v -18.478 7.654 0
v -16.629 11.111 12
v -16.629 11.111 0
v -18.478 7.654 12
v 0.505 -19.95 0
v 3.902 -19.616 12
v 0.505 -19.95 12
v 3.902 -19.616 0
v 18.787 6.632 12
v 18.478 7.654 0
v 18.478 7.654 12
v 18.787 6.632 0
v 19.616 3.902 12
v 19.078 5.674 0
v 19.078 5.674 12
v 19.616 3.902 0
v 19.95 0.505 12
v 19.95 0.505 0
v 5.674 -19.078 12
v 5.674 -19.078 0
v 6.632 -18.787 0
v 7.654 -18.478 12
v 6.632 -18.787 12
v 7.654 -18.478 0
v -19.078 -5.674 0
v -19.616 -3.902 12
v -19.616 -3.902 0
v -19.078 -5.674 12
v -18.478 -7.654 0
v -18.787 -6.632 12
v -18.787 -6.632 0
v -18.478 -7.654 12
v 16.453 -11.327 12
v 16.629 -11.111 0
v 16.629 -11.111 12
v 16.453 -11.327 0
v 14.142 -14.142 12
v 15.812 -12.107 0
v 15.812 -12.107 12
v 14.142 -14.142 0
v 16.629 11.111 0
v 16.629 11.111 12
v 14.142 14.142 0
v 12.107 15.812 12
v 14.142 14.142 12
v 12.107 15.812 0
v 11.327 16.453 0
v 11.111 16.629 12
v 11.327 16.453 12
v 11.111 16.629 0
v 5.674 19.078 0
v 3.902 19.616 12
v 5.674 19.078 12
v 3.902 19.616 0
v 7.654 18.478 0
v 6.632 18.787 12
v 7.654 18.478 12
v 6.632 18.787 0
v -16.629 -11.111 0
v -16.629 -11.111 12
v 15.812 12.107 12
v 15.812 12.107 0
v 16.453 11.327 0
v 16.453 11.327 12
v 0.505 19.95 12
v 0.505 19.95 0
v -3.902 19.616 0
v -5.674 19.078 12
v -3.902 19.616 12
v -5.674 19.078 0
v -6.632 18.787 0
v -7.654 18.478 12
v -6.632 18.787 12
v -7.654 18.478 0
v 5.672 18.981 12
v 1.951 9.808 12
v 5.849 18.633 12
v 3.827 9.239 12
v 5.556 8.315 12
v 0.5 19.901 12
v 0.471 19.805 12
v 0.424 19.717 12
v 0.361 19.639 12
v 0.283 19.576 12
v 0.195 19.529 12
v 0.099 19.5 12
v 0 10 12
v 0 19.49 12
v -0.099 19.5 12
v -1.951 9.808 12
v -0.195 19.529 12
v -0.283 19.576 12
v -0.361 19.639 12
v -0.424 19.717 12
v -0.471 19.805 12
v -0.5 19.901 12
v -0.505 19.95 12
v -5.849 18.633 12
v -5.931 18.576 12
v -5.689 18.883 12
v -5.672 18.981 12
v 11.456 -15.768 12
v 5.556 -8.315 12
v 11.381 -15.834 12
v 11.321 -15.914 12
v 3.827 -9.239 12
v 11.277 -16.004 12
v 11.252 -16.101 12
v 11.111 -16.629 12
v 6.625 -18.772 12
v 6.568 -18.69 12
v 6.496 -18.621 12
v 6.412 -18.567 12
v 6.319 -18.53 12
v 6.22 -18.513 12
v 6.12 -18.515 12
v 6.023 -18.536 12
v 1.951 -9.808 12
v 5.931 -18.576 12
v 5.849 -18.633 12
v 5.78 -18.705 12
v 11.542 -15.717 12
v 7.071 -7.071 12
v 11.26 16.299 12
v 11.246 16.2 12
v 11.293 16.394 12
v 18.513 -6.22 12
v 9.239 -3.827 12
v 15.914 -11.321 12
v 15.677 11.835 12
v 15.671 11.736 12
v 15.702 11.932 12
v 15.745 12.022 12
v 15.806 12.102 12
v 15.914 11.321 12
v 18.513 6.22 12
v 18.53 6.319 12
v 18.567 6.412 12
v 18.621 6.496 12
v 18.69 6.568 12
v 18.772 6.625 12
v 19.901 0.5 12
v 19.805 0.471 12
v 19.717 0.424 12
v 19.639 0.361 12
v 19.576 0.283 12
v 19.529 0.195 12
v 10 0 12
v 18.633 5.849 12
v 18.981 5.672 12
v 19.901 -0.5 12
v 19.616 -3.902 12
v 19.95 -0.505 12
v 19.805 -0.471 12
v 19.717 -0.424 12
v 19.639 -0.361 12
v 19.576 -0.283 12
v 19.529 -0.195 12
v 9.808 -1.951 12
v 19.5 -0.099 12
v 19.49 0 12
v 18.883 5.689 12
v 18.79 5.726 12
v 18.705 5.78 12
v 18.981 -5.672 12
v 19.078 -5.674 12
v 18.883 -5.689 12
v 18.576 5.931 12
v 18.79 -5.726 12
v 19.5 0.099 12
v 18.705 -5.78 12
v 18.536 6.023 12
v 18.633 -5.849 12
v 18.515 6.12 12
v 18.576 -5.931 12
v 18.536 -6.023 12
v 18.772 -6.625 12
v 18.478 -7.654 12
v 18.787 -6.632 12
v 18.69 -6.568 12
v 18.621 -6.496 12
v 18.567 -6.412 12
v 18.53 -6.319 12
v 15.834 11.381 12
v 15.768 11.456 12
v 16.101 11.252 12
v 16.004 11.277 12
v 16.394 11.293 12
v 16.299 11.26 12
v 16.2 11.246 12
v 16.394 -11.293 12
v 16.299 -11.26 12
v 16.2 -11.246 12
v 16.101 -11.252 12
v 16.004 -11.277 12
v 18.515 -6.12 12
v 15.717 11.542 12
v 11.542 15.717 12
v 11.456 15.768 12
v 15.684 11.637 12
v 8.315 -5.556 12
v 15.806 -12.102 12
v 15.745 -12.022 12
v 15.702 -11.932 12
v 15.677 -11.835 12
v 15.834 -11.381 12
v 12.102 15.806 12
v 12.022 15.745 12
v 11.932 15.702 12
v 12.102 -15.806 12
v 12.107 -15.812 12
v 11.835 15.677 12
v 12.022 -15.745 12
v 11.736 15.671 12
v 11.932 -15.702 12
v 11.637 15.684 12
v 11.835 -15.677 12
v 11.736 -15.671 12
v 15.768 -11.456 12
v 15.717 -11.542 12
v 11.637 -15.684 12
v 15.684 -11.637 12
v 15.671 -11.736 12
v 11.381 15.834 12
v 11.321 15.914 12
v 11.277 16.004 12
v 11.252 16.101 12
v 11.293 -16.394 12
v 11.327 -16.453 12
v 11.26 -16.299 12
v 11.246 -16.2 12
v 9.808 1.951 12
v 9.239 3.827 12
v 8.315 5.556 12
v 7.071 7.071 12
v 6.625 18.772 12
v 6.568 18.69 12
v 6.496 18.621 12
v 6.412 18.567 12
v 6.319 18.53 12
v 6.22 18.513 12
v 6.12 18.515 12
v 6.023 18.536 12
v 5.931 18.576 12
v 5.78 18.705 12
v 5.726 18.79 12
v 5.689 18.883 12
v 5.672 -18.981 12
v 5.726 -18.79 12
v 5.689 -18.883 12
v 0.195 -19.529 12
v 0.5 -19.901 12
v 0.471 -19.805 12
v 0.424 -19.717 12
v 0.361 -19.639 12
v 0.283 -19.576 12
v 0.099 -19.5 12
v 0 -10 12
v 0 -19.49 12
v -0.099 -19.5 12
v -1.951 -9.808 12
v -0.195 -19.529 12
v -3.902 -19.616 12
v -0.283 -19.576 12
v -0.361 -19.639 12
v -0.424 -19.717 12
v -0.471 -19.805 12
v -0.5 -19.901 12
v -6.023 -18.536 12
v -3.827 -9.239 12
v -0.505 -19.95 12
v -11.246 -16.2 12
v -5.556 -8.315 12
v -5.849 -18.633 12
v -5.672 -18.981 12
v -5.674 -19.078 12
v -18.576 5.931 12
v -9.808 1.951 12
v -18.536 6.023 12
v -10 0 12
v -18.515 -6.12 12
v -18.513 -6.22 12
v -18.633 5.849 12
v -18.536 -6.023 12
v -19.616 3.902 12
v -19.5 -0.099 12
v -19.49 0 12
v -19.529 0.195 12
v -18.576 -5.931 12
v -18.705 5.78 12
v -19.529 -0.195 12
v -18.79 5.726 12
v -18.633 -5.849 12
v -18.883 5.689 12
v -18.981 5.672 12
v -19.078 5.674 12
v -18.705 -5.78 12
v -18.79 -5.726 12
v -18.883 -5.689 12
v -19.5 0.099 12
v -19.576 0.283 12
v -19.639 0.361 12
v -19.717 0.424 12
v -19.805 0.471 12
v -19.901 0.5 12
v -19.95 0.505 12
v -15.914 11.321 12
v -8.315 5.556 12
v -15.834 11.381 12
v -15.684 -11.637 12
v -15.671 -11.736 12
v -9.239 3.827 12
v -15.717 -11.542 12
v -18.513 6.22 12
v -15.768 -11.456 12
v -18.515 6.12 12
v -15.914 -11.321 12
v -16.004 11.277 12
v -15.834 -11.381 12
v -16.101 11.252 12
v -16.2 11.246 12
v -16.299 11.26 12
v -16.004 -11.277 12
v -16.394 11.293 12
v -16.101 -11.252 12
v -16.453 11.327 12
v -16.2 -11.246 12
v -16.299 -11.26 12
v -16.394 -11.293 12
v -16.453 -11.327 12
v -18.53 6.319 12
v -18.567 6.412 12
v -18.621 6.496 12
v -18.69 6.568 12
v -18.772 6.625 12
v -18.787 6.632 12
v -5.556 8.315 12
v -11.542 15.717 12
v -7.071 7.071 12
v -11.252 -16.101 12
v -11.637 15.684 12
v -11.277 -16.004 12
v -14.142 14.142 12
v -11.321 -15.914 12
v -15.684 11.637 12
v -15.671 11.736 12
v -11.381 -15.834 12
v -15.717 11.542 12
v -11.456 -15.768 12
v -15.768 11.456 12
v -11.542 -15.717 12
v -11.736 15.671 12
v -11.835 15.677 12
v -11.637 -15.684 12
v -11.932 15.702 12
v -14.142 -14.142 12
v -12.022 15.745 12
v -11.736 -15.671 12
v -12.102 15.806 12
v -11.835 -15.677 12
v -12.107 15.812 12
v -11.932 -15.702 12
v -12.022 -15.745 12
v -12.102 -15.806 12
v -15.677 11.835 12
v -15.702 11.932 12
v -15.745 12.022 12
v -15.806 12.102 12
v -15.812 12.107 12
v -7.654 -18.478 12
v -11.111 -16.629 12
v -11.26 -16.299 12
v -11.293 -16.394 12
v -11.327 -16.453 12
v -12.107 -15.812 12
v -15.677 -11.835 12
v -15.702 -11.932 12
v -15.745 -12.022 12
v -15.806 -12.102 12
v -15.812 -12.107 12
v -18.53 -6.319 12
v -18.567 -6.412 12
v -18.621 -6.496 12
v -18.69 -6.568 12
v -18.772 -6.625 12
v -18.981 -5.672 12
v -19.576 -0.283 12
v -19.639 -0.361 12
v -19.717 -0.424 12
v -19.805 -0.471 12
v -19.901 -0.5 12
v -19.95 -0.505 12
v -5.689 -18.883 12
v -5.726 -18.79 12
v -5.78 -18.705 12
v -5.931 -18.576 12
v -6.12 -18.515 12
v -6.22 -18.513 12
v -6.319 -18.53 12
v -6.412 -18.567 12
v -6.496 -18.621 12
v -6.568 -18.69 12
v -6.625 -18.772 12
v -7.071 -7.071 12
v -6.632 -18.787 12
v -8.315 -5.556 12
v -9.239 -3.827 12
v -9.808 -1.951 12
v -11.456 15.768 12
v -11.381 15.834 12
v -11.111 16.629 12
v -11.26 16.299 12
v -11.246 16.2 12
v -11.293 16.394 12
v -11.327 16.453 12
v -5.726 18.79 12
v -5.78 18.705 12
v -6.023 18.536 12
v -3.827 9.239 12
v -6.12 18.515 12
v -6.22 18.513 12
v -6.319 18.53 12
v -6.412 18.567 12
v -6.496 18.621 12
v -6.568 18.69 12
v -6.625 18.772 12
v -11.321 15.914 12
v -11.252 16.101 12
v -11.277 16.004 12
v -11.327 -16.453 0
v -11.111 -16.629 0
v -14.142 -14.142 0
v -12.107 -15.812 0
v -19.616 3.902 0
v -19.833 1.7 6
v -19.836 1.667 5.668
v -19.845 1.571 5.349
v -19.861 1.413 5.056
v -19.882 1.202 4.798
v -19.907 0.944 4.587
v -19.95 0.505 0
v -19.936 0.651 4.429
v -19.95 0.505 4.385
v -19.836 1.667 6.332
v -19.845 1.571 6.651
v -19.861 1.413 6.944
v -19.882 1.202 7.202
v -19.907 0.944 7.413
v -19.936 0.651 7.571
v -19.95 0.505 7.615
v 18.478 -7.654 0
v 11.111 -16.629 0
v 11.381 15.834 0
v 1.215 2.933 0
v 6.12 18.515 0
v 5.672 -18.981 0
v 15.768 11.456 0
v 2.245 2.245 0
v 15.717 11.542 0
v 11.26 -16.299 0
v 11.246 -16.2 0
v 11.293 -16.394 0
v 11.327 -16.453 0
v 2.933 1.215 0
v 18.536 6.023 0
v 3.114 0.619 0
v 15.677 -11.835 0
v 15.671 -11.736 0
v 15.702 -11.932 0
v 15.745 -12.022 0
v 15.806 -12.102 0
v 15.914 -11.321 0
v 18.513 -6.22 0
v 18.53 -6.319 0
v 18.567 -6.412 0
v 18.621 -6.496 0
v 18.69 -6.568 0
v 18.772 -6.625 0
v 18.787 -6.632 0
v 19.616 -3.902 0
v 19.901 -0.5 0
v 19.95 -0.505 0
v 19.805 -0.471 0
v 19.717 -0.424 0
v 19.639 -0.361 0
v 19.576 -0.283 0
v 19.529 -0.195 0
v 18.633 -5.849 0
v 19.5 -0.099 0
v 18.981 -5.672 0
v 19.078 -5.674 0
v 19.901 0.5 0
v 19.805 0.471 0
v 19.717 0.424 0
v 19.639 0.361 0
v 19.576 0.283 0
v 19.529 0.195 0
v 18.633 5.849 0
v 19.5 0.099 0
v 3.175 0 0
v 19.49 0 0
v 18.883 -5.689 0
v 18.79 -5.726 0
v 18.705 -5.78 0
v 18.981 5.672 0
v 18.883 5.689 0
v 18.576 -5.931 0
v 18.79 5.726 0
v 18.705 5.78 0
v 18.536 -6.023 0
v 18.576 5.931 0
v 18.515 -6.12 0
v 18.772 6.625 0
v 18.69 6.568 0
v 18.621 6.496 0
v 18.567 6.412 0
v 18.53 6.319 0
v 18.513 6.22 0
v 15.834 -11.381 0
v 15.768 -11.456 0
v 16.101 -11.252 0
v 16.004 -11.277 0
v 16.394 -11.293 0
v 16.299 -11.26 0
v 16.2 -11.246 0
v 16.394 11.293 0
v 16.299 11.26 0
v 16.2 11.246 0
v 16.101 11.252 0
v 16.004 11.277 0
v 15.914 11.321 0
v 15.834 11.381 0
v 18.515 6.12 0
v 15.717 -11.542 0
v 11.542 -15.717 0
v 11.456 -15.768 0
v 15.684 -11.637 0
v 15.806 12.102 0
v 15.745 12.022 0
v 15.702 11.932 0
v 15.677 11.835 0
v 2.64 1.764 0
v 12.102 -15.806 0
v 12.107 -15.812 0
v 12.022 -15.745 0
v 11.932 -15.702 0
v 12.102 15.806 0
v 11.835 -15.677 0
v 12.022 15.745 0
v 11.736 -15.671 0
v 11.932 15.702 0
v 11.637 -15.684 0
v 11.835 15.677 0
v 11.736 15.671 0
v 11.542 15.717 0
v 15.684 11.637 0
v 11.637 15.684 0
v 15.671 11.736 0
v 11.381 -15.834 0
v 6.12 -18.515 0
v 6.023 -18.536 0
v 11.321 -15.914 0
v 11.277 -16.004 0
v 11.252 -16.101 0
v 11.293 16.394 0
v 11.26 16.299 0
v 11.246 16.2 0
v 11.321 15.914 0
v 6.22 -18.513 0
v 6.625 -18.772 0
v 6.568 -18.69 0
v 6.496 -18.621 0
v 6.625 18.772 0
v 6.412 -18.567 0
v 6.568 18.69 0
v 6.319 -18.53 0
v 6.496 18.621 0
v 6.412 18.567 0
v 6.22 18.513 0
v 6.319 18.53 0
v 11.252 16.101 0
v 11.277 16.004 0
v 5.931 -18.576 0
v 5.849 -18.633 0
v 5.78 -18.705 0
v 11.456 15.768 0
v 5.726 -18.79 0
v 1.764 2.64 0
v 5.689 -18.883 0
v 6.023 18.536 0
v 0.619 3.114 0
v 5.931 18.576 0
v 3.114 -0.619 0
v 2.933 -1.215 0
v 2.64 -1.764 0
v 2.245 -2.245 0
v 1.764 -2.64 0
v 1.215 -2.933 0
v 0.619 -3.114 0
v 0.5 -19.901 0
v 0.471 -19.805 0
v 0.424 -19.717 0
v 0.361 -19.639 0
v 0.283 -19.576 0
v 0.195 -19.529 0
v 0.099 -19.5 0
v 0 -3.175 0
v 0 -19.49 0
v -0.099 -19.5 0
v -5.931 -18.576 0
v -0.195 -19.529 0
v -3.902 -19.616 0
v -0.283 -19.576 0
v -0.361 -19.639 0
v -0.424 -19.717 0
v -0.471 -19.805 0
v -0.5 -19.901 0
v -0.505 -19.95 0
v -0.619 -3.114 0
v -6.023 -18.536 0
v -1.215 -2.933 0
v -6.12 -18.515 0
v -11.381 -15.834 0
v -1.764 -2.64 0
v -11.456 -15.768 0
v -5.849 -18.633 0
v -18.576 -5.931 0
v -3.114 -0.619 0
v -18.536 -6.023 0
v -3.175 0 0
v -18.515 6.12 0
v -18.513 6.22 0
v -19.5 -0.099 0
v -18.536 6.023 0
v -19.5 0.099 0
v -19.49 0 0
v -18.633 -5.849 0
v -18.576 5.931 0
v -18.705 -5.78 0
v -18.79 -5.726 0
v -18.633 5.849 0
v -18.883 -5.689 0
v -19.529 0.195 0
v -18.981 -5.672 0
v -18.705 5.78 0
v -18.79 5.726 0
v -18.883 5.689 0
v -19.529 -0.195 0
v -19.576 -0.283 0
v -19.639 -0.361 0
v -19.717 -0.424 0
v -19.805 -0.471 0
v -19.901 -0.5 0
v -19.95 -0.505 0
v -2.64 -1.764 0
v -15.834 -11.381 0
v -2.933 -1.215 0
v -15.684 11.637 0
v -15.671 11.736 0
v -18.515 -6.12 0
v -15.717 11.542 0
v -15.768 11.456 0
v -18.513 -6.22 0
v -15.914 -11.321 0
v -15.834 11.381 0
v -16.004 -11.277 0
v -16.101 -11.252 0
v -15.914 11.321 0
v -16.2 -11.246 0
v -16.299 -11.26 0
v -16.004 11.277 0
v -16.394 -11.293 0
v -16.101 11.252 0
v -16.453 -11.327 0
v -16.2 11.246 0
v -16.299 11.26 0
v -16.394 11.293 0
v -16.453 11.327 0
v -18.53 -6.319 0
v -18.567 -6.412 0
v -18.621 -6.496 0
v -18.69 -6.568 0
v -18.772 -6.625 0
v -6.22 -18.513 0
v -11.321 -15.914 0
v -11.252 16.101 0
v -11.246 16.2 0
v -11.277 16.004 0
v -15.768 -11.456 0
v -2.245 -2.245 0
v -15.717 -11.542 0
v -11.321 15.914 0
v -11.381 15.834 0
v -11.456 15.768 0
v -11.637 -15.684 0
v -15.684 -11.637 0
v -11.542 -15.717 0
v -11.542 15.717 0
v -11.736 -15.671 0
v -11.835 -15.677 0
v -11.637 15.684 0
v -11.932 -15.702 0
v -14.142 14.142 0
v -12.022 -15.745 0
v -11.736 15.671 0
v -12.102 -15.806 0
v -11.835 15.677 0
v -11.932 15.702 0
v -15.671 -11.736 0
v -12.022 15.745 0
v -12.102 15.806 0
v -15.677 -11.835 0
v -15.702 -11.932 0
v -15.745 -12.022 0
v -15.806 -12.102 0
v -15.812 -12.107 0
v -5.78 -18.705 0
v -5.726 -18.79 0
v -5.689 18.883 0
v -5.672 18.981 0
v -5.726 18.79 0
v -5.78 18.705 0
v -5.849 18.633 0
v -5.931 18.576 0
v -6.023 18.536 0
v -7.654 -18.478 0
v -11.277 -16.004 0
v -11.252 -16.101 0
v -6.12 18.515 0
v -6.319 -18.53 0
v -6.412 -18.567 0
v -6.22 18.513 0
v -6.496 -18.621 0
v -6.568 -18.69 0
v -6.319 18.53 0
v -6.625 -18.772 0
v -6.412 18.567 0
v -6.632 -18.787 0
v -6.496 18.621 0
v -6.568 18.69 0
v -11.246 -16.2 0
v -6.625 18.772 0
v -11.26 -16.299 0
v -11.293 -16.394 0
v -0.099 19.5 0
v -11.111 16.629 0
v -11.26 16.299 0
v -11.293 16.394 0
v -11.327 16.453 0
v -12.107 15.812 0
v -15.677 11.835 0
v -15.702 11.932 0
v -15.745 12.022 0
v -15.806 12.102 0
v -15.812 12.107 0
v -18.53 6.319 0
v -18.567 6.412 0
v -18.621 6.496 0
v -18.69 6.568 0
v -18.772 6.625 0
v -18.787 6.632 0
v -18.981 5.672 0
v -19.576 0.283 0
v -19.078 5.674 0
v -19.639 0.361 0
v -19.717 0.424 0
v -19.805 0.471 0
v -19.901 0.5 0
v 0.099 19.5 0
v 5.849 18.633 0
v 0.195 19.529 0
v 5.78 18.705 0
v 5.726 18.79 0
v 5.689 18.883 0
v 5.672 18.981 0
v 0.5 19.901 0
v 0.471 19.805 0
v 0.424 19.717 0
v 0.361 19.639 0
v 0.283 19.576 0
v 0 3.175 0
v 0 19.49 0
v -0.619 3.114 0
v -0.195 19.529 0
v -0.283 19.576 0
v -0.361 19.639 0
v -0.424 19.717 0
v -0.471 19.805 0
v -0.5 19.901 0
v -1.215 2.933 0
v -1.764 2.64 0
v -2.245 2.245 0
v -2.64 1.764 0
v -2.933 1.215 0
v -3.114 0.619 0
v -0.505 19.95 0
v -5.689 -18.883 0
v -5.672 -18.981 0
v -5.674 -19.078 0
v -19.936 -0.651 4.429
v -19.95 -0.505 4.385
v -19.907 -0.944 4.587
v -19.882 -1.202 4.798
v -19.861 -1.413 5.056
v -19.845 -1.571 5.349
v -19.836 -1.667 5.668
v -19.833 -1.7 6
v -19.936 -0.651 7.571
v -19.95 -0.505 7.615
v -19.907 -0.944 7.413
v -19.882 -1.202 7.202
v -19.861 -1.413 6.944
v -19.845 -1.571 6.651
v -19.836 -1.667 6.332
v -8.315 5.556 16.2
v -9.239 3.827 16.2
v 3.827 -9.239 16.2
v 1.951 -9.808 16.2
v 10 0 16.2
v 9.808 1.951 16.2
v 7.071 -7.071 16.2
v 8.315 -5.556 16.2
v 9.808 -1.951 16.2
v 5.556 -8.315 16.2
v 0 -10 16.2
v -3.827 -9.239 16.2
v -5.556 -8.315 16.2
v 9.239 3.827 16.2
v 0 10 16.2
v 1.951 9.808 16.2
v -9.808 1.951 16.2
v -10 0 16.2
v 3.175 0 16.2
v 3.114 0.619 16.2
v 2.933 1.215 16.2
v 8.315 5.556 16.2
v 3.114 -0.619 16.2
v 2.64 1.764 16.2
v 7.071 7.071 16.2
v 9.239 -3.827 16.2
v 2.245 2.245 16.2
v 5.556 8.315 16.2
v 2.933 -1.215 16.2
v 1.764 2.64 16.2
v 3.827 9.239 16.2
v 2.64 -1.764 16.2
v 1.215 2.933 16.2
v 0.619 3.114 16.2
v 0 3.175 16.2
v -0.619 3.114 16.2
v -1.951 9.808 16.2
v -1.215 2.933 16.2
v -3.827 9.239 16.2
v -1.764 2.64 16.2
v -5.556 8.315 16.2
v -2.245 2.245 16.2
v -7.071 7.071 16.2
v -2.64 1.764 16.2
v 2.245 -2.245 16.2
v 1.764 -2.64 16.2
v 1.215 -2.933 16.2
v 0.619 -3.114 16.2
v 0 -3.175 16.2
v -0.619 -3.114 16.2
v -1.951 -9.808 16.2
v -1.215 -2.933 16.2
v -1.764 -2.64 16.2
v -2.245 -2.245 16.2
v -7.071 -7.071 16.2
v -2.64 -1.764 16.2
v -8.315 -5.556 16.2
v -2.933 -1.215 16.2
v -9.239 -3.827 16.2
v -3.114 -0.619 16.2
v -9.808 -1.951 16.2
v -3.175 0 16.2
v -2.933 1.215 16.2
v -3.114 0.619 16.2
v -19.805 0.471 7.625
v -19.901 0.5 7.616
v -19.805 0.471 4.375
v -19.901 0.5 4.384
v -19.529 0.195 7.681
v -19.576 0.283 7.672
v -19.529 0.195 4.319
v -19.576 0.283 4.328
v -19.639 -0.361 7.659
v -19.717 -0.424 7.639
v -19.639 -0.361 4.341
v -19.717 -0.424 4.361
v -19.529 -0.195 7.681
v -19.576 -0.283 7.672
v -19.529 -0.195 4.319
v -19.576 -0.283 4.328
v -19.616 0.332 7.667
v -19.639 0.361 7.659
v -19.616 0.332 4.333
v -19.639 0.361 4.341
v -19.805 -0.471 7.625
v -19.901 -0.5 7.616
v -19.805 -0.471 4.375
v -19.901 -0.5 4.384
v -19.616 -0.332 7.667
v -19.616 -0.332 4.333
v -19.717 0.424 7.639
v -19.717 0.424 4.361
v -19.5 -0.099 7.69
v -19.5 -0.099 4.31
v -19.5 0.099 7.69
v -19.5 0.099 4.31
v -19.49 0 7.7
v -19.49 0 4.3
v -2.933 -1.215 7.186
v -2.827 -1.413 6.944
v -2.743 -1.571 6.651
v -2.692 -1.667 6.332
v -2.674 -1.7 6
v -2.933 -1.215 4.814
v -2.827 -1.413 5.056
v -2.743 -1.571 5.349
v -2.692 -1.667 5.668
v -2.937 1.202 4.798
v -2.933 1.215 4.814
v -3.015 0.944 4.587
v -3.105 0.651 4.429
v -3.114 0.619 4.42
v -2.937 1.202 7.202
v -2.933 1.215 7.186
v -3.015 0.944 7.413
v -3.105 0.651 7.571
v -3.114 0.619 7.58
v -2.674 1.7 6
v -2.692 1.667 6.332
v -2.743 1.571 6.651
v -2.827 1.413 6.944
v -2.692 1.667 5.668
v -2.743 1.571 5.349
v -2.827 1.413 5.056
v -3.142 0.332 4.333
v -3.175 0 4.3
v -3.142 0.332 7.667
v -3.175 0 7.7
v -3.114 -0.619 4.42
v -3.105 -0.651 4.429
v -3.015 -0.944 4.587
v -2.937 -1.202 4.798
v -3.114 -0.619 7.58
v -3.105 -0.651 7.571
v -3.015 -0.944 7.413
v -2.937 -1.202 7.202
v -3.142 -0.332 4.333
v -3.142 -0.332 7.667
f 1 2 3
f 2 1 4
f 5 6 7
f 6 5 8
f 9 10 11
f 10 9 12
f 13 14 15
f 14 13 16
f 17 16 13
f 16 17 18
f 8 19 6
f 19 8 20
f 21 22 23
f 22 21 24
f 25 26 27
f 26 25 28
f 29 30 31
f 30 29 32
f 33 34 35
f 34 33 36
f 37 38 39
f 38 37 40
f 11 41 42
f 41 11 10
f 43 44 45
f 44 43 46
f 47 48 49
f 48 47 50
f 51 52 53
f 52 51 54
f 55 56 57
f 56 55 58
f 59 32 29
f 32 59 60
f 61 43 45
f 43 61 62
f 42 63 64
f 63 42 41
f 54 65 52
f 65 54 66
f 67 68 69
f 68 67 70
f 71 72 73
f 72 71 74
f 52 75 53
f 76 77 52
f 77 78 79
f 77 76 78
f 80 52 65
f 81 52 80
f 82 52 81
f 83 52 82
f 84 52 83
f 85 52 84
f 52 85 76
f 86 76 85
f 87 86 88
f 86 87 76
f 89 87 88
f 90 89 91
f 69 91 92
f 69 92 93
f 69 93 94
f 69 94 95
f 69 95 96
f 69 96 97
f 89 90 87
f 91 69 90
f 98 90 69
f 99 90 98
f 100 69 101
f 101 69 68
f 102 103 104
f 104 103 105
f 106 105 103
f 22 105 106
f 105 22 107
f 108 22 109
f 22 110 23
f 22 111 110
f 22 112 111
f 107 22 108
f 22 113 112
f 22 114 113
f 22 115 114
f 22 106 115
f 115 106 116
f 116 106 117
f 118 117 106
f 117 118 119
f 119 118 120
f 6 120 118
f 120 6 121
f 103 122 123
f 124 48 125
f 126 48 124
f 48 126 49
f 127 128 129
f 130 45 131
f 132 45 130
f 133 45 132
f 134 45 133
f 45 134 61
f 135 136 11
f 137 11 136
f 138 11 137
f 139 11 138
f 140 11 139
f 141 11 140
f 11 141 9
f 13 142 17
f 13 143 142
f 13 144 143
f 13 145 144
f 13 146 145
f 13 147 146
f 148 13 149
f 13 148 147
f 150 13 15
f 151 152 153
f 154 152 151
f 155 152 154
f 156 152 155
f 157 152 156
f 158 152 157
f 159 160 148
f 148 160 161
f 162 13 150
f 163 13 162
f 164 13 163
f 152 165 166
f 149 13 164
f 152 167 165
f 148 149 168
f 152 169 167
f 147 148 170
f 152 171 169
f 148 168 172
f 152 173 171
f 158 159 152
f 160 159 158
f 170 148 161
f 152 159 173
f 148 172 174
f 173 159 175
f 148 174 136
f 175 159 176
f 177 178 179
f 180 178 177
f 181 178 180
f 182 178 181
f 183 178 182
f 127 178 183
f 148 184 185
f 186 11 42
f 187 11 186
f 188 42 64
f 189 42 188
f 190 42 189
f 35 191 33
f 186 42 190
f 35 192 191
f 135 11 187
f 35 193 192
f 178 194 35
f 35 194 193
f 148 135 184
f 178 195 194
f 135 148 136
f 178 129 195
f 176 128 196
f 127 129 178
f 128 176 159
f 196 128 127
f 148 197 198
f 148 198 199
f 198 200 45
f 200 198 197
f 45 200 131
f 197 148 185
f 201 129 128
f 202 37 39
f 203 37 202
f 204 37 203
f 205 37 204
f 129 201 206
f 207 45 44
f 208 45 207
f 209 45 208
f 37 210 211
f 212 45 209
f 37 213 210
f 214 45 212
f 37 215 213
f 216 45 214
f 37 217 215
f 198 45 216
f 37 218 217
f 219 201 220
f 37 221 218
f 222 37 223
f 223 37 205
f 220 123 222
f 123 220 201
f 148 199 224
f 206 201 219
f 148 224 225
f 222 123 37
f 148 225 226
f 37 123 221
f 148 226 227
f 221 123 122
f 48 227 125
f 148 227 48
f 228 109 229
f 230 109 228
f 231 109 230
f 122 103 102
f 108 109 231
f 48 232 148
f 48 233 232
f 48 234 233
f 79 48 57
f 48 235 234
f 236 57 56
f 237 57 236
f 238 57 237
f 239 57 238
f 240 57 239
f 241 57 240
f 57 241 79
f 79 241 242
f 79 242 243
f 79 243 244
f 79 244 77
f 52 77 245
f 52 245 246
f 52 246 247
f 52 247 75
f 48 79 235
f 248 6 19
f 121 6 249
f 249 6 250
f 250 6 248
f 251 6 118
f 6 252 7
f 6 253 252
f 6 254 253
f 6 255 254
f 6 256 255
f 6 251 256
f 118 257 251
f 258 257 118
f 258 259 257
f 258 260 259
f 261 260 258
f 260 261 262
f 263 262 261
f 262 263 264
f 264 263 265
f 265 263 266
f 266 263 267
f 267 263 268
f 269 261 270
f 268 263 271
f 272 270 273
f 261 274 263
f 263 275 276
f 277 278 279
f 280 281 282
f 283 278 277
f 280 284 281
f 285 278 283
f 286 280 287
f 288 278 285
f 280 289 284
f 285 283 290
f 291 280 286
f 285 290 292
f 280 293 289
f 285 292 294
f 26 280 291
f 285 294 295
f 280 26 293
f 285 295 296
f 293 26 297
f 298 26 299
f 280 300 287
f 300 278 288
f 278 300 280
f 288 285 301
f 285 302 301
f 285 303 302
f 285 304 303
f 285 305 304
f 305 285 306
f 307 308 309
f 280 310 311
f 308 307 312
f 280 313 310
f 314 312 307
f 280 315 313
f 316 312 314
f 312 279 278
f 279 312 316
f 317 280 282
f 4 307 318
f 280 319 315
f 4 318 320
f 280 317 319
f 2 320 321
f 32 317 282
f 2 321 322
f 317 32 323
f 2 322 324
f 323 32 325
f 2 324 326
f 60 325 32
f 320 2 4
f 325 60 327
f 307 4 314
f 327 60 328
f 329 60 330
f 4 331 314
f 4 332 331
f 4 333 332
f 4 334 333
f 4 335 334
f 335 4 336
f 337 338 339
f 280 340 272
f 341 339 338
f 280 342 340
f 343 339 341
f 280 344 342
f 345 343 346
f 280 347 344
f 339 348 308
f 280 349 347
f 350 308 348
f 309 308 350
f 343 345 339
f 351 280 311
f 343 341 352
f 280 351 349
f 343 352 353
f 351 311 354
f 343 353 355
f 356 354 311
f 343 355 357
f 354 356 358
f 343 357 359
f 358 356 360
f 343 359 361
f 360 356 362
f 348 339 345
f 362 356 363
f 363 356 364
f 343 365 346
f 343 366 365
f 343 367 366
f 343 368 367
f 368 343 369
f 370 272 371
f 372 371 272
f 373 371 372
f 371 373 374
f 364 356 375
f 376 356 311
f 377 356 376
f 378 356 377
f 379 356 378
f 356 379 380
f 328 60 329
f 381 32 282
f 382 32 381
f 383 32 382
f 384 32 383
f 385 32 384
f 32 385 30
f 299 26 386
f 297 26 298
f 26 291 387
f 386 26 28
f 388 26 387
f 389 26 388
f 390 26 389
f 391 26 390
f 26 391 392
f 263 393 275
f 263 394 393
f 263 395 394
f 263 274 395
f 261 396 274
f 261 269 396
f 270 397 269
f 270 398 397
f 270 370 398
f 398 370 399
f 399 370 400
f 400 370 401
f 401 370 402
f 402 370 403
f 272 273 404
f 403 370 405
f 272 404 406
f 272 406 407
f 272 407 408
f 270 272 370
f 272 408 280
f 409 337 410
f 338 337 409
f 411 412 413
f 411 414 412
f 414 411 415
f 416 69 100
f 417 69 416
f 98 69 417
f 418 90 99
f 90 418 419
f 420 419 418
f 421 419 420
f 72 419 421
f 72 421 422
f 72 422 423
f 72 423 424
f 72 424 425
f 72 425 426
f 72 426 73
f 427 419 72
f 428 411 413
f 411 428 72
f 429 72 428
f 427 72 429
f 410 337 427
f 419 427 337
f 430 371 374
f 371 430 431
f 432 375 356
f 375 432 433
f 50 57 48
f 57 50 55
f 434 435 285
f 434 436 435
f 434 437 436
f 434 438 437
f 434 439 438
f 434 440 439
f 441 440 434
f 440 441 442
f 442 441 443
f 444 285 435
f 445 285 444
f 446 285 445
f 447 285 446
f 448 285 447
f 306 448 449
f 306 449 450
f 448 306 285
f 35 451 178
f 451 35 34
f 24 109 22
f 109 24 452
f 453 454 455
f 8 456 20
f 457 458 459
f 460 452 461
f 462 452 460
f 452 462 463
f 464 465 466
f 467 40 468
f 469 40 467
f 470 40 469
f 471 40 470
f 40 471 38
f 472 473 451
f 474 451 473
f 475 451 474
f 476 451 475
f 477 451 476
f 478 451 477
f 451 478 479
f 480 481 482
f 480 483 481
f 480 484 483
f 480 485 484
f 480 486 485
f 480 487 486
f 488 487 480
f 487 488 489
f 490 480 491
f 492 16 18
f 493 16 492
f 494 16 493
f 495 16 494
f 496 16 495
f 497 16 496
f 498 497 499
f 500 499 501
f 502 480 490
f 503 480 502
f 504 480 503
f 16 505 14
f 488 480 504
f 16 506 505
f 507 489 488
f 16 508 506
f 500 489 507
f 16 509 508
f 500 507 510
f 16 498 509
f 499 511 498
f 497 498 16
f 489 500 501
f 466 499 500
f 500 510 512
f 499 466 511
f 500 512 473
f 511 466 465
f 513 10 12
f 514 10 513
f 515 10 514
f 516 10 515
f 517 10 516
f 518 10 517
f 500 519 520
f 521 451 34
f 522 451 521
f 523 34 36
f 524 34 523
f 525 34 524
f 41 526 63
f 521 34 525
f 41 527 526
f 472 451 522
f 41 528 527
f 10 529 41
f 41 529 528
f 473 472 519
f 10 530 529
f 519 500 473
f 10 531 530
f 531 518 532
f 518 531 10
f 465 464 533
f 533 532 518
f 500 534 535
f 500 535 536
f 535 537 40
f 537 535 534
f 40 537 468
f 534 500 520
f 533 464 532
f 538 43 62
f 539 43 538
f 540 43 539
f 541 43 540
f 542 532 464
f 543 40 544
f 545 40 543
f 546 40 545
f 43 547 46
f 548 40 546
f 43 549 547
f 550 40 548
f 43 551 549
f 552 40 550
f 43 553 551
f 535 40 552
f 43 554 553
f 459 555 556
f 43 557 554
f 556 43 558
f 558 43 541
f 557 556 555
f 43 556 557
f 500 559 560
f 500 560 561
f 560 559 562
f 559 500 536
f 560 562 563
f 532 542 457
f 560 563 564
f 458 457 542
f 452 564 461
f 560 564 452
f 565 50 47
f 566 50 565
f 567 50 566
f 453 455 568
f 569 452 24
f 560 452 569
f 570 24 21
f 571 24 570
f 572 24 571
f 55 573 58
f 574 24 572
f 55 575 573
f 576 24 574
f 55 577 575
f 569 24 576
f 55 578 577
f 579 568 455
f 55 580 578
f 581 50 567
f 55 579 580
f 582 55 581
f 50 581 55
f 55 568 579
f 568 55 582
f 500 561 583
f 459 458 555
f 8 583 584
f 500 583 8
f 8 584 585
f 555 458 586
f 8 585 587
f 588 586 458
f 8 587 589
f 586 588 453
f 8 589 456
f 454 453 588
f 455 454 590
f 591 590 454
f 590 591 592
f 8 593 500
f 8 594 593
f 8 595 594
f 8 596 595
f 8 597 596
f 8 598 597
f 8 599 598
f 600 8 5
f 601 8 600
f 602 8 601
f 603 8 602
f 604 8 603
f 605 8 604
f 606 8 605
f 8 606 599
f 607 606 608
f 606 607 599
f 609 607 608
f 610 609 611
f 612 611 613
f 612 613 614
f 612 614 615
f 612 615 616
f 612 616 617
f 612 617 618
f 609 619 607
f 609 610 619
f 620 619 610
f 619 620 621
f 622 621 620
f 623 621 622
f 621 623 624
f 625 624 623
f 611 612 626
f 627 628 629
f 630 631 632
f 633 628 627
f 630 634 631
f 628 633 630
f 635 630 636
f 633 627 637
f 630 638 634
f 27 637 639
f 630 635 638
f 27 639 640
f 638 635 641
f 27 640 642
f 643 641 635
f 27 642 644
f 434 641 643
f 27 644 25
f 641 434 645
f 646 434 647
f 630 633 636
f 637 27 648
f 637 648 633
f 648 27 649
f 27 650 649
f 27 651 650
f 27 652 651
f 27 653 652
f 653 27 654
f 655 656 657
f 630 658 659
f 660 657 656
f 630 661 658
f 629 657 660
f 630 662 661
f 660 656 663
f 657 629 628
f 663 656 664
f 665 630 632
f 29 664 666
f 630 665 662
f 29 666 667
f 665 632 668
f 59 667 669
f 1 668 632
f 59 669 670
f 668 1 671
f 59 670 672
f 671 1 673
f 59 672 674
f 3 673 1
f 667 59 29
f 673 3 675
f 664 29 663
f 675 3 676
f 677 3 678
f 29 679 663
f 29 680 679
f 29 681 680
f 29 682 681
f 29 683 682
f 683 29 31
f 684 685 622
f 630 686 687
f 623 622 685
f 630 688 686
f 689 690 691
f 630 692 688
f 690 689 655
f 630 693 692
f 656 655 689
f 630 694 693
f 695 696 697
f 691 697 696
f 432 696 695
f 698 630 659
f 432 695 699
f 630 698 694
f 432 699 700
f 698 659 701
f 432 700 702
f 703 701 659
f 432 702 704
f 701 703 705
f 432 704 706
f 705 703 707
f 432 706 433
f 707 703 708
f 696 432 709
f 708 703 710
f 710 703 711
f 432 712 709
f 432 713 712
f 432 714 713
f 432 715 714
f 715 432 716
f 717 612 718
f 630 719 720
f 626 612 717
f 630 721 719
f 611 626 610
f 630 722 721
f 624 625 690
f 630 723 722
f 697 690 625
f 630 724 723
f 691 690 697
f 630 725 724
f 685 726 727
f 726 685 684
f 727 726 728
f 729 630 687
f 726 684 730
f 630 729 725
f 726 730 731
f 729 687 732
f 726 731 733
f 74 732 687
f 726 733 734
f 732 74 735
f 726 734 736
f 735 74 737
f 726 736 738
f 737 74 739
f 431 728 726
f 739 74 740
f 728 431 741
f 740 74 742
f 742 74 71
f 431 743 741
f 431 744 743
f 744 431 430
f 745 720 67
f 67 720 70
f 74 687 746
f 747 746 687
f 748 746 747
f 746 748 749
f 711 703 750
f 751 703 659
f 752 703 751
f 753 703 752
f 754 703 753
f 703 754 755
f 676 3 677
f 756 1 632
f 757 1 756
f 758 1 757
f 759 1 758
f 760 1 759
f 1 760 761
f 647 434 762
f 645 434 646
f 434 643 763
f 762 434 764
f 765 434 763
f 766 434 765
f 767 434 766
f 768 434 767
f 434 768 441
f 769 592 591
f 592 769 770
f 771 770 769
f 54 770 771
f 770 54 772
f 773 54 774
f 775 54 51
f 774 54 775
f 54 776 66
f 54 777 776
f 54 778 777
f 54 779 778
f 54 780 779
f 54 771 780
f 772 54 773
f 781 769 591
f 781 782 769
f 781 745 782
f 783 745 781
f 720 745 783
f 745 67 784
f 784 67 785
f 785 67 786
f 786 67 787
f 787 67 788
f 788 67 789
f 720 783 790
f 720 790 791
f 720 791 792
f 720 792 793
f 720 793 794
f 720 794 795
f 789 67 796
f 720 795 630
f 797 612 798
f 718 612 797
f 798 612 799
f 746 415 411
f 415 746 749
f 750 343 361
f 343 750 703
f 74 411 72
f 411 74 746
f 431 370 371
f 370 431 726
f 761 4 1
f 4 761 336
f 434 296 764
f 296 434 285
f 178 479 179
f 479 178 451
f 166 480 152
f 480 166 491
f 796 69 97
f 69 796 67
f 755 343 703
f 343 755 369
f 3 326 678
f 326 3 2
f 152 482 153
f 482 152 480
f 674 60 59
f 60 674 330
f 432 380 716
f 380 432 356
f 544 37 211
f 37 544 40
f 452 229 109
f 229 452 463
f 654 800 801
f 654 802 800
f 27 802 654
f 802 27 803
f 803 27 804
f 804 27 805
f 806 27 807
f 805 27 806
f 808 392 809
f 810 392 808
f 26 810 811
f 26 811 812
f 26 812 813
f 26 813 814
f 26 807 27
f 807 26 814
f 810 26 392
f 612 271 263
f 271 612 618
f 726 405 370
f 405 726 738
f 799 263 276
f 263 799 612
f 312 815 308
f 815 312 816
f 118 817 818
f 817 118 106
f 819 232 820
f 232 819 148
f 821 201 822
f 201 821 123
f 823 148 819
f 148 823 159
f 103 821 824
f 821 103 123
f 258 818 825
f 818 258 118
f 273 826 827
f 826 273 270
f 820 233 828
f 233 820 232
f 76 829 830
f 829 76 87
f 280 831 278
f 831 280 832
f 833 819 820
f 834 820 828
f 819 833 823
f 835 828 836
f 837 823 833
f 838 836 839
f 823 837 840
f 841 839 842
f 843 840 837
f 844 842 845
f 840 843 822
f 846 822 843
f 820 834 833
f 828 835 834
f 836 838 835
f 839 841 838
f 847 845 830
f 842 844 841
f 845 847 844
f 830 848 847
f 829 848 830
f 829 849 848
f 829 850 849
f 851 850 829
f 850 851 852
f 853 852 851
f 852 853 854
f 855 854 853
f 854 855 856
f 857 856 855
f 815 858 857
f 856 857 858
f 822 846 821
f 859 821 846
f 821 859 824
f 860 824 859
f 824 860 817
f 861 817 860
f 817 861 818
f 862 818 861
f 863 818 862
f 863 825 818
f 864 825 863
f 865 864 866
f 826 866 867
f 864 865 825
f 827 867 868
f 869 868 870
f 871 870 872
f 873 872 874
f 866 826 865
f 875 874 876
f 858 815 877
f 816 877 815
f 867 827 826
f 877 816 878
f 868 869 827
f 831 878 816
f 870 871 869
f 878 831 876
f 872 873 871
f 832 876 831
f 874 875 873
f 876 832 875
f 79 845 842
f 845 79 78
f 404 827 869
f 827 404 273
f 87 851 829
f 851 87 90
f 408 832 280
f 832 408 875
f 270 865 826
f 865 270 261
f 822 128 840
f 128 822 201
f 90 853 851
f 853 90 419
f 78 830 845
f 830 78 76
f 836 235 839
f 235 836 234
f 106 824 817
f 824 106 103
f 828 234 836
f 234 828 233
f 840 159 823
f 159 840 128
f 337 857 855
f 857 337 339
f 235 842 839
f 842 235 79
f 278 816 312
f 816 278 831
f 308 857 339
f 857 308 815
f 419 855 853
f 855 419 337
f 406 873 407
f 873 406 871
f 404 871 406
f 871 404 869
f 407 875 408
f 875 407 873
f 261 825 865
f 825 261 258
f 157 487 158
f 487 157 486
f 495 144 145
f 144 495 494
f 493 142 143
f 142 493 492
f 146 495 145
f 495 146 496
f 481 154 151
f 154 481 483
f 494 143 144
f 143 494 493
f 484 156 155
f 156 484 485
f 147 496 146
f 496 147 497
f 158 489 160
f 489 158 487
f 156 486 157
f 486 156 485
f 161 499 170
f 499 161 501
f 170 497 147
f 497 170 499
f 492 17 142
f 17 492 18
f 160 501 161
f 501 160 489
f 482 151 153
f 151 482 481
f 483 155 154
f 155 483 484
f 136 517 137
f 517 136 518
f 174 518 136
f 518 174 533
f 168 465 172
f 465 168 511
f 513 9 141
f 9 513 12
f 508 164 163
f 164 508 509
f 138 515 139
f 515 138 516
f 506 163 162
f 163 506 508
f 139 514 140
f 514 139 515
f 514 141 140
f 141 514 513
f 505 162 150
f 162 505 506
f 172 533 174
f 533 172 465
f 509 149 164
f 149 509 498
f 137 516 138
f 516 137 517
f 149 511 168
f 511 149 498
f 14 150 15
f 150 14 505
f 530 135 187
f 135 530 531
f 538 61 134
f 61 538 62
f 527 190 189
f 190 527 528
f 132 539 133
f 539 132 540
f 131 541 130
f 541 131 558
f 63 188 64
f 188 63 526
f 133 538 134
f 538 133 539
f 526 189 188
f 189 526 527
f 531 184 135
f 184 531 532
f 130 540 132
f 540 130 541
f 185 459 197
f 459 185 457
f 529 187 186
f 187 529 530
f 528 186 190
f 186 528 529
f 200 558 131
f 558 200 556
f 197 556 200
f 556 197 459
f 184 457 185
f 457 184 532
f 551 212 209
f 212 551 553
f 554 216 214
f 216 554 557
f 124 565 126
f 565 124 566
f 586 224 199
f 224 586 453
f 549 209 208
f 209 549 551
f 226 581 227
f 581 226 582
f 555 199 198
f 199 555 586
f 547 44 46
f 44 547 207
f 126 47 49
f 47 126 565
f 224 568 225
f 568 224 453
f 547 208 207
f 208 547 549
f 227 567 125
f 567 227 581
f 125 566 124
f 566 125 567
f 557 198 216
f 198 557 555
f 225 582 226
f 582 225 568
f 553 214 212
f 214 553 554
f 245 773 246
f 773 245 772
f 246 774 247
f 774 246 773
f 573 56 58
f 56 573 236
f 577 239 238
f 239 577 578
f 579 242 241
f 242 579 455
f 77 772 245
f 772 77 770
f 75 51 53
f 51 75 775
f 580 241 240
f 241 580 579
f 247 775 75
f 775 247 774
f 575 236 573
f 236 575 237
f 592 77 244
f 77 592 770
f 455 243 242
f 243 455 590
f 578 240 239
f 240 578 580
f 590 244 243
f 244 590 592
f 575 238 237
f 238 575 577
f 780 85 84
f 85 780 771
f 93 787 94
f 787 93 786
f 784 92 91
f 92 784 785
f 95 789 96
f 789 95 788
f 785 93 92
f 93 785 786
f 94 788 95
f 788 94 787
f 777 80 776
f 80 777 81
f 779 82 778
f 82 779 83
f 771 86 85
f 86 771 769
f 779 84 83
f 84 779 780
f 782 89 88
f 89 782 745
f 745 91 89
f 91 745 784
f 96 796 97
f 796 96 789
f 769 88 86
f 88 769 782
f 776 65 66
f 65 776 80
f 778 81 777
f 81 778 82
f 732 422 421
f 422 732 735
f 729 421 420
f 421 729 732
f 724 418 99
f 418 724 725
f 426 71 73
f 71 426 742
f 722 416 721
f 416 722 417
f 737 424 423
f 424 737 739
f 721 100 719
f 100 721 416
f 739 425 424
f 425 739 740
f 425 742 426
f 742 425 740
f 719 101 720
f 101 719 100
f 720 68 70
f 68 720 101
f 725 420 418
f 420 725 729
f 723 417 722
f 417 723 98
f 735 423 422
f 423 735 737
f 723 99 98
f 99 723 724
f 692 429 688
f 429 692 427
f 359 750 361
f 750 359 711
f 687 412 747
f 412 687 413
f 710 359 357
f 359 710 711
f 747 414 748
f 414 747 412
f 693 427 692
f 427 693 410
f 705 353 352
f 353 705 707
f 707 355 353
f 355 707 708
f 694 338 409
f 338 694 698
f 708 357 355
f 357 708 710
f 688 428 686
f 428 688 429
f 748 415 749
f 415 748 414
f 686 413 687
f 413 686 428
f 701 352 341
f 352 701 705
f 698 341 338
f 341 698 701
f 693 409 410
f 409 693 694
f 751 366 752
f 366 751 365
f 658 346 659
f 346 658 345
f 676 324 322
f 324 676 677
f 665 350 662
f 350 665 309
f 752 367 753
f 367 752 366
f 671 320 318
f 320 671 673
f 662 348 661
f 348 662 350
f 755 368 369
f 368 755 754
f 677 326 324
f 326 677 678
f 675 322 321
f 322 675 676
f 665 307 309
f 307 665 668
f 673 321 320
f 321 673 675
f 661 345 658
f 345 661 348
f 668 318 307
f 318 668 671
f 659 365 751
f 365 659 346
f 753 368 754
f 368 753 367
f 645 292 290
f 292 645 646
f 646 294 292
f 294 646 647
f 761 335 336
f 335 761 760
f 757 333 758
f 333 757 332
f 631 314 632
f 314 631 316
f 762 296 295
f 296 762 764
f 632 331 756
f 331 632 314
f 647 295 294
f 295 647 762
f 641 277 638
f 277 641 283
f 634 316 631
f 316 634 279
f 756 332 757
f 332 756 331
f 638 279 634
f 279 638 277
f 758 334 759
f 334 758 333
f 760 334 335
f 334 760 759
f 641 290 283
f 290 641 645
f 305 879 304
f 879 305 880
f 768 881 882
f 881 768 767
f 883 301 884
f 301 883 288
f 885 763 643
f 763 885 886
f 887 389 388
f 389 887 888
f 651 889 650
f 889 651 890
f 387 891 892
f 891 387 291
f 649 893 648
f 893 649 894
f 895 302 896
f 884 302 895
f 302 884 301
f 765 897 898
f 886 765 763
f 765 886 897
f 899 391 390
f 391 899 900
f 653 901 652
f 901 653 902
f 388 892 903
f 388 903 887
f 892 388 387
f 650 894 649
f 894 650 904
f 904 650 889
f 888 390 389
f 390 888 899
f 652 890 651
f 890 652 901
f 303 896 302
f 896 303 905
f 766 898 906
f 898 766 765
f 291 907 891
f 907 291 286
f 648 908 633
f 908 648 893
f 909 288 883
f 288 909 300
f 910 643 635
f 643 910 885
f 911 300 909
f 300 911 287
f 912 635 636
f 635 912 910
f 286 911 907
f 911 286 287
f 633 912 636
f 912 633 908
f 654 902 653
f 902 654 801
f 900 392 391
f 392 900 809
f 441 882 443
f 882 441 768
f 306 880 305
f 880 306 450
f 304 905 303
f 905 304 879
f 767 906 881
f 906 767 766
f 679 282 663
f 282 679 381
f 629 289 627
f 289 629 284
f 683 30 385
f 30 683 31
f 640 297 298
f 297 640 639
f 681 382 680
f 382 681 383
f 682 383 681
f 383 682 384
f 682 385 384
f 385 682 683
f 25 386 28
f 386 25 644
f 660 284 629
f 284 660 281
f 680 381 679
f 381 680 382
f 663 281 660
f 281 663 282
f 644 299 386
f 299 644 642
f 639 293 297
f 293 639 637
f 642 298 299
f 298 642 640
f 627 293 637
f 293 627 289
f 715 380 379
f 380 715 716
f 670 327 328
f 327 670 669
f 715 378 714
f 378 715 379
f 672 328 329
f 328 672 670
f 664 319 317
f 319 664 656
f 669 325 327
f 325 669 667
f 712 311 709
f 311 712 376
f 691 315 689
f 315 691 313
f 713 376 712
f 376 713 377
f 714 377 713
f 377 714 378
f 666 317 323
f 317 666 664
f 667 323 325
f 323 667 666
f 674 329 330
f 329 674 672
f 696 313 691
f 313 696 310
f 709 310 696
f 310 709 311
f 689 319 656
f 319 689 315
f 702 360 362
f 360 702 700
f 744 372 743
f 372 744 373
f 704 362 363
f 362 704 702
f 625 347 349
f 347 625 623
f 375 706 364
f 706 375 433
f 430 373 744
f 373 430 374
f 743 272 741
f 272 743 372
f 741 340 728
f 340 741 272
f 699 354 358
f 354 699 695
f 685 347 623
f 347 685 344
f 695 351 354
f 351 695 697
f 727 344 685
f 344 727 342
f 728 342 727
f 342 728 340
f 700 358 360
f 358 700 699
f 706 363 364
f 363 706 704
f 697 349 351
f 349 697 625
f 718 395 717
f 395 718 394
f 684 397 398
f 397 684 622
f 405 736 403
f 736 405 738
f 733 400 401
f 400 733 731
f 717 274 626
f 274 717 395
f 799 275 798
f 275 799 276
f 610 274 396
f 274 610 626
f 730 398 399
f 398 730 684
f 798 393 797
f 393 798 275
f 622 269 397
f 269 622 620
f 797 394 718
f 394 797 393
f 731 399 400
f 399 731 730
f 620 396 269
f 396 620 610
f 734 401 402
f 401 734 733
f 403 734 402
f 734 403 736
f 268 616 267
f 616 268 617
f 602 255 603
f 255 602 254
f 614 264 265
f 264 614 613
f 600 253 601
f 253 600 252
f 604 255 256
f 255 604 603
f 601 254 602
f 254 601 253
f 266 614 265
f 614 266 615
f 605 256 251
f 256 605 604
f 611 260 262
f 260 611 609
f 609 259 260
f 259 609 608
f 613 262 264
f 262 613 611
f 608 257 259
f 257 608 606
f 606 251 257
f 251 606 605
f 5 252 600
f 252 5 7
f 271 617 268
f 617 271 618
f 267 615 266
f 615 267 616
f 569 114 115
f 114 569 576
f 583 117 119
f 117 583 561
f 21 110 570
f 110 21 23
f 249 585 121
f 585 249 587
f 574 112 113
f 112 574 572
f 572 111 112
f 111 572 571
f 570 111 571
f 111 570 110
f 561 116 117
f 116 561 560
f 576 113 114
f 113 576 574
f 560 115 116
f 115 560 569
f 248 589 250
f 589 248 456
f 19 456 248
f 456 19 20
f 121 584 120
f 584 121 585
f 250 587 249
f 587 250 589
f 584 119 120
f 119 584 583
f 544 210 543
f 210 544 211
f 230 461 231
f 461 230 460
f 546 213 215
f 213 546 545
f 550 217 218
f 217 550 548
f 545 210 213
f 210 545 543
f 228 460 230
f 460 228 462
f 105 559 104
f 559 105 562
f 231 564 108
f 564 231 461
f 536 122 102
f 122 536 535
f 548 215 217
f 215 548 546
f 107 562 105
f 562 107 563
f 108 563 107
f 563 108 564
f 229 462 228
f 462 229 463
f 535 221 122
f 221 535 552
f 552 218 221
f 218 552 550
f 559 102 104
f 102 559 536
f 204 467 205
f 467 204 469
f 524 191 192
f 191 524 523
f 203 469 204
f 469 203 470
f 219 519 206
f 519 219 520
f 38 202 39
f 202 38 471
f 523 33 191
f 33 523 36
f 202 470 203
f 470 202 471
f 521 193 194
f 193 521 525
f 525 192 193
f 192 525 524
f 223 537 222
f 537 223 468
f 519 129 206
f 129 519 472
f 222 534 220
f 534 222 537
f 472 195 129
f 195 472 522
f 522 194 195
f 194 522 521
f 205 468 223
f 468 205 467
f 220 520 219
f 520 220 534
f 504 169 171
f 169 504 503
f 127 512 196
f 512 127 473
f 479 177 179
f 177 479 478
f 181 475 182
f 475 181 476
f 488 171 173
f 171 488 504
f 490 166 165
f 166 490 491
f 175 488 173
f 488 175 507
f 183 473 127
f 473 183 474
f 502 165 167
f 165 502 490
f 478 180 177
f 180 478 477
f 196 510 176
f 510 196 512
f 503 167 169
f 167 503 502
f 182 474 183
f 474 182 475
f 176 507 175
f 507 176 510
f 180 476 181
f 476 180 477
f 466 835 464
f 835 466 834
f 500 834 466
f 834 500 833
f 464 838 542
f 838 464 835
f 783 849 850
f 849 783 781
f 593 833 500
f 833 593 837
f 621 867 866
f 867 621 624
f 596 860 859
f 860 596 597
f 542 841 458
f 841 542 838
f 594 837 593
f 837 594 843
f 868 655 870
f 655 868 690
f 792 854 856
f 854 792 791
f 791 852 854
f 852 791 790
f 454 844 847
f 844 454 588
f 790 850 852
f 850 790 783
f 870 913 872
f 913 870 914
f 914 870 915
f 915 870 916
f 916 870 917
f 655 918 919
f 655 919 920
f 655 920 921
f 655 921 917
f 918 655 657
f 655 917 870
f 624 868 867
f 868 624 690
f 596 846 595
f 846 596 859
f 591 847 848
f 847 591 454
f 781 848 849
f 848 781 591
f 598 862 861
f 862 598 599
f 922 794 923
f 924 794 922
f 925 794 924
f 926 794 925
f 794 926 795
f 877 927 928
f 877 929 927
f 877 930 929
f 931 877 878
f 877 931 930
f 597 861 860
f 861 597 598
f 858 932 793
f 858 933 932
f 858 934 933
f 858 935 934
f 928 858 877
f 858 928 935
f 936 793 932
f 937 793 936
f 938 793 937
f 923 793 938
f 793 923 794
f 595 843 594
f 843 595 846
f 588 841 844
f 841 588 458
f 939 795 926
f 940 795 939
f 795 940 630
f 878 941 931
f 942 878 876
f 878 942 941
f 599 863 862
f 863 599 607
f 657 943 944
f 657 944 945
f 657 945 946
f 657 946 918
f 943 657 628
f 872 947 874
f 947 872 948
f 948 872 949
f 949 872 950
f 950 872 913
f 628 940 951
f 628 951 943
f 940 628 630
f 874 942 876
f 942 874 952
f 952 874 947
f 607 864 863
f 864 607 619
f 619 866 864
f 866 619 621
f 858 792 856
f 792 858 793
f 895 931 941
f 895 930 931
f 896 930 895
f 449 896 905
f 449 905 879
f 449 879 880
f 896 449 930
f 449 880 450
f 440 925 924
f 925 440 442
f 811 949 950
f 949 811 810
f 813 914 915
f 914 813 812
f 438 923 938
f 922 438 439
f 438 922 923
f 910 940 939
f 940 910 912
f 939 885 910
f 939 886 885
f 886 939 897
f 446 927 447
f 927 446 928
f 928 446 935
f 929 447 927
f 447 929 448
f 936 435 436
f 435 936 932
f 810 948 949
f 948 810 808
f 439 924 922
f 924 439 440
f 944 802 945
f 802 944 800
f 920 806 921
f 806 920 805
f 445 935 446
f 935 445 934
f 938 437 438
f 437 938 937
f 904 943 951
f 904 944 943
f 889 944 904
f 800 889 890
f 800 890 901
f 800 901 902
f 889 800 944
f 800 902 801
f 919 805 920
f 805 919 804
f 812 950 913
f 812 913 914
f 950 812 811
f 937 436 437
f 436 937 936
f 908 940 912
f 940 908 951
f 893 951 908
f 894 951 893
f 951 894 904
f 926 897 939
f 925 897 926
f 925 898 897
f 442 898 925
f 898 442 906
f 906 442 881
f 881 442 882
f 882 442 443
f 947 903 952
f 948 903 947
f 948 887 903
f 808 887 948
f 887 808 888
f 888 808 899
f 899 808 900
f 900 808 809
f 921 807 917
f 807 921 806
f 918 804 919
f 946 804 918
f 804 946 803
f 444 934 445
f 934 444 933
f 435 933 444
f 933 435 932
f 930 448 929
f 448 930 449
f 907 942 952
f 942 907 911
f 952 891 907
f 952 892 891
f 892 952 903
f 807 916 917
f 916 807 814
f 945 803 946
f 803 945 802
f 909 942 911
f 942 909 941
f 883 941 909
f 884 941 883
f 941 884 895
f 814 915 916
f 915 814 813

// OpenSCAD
$fn = 32;

// ----------------------------------------------------------------------
// Hand knob: 40 x 40 x 16.2 mm
// ----------------------------------------------------------------------

// --- parameters (mm) ---
head_d = 40;              // knob diameter
head_h = 12;              // knob height
hole_d = 6.35;            // shaft bore
set_d = 3.4;              // set screw tap hole
notch_d = 1.02;           // knurl groove diameter
knurl_n = 20;             // number of knurl grooves
cap_h = 4.2;              // raised centre cap
cap_d = 20;               // centre cap diameter

module body() {
  cylinder(h = head_h, d = head_d);
}

module cap() {
  translate([0, 0, head_h - 1]) cylinder(h = cap_h + 1, d = cap_d);
}

difference() {
  union() {
    body();
    cap();
  }
  translate([0, 0, -1]) cylinder(h = head_h + cap_h + 2, d = hole_d);
  /* knurl grooves */
  for (i = [0 : knurl_n - 1])
    rotate([0, 0, i * 360 / knurl_n])
      translate([head_d / 2, 0, -0.5])
        cylinder(h = head_h + 1, d = notch_d);
  translate([-head_d / 2 - 1, 0, head_h * 0.5]) rotate([0, 90, 0]) cylinder(h = head_d / 2 + 2, d = set_d);
}
